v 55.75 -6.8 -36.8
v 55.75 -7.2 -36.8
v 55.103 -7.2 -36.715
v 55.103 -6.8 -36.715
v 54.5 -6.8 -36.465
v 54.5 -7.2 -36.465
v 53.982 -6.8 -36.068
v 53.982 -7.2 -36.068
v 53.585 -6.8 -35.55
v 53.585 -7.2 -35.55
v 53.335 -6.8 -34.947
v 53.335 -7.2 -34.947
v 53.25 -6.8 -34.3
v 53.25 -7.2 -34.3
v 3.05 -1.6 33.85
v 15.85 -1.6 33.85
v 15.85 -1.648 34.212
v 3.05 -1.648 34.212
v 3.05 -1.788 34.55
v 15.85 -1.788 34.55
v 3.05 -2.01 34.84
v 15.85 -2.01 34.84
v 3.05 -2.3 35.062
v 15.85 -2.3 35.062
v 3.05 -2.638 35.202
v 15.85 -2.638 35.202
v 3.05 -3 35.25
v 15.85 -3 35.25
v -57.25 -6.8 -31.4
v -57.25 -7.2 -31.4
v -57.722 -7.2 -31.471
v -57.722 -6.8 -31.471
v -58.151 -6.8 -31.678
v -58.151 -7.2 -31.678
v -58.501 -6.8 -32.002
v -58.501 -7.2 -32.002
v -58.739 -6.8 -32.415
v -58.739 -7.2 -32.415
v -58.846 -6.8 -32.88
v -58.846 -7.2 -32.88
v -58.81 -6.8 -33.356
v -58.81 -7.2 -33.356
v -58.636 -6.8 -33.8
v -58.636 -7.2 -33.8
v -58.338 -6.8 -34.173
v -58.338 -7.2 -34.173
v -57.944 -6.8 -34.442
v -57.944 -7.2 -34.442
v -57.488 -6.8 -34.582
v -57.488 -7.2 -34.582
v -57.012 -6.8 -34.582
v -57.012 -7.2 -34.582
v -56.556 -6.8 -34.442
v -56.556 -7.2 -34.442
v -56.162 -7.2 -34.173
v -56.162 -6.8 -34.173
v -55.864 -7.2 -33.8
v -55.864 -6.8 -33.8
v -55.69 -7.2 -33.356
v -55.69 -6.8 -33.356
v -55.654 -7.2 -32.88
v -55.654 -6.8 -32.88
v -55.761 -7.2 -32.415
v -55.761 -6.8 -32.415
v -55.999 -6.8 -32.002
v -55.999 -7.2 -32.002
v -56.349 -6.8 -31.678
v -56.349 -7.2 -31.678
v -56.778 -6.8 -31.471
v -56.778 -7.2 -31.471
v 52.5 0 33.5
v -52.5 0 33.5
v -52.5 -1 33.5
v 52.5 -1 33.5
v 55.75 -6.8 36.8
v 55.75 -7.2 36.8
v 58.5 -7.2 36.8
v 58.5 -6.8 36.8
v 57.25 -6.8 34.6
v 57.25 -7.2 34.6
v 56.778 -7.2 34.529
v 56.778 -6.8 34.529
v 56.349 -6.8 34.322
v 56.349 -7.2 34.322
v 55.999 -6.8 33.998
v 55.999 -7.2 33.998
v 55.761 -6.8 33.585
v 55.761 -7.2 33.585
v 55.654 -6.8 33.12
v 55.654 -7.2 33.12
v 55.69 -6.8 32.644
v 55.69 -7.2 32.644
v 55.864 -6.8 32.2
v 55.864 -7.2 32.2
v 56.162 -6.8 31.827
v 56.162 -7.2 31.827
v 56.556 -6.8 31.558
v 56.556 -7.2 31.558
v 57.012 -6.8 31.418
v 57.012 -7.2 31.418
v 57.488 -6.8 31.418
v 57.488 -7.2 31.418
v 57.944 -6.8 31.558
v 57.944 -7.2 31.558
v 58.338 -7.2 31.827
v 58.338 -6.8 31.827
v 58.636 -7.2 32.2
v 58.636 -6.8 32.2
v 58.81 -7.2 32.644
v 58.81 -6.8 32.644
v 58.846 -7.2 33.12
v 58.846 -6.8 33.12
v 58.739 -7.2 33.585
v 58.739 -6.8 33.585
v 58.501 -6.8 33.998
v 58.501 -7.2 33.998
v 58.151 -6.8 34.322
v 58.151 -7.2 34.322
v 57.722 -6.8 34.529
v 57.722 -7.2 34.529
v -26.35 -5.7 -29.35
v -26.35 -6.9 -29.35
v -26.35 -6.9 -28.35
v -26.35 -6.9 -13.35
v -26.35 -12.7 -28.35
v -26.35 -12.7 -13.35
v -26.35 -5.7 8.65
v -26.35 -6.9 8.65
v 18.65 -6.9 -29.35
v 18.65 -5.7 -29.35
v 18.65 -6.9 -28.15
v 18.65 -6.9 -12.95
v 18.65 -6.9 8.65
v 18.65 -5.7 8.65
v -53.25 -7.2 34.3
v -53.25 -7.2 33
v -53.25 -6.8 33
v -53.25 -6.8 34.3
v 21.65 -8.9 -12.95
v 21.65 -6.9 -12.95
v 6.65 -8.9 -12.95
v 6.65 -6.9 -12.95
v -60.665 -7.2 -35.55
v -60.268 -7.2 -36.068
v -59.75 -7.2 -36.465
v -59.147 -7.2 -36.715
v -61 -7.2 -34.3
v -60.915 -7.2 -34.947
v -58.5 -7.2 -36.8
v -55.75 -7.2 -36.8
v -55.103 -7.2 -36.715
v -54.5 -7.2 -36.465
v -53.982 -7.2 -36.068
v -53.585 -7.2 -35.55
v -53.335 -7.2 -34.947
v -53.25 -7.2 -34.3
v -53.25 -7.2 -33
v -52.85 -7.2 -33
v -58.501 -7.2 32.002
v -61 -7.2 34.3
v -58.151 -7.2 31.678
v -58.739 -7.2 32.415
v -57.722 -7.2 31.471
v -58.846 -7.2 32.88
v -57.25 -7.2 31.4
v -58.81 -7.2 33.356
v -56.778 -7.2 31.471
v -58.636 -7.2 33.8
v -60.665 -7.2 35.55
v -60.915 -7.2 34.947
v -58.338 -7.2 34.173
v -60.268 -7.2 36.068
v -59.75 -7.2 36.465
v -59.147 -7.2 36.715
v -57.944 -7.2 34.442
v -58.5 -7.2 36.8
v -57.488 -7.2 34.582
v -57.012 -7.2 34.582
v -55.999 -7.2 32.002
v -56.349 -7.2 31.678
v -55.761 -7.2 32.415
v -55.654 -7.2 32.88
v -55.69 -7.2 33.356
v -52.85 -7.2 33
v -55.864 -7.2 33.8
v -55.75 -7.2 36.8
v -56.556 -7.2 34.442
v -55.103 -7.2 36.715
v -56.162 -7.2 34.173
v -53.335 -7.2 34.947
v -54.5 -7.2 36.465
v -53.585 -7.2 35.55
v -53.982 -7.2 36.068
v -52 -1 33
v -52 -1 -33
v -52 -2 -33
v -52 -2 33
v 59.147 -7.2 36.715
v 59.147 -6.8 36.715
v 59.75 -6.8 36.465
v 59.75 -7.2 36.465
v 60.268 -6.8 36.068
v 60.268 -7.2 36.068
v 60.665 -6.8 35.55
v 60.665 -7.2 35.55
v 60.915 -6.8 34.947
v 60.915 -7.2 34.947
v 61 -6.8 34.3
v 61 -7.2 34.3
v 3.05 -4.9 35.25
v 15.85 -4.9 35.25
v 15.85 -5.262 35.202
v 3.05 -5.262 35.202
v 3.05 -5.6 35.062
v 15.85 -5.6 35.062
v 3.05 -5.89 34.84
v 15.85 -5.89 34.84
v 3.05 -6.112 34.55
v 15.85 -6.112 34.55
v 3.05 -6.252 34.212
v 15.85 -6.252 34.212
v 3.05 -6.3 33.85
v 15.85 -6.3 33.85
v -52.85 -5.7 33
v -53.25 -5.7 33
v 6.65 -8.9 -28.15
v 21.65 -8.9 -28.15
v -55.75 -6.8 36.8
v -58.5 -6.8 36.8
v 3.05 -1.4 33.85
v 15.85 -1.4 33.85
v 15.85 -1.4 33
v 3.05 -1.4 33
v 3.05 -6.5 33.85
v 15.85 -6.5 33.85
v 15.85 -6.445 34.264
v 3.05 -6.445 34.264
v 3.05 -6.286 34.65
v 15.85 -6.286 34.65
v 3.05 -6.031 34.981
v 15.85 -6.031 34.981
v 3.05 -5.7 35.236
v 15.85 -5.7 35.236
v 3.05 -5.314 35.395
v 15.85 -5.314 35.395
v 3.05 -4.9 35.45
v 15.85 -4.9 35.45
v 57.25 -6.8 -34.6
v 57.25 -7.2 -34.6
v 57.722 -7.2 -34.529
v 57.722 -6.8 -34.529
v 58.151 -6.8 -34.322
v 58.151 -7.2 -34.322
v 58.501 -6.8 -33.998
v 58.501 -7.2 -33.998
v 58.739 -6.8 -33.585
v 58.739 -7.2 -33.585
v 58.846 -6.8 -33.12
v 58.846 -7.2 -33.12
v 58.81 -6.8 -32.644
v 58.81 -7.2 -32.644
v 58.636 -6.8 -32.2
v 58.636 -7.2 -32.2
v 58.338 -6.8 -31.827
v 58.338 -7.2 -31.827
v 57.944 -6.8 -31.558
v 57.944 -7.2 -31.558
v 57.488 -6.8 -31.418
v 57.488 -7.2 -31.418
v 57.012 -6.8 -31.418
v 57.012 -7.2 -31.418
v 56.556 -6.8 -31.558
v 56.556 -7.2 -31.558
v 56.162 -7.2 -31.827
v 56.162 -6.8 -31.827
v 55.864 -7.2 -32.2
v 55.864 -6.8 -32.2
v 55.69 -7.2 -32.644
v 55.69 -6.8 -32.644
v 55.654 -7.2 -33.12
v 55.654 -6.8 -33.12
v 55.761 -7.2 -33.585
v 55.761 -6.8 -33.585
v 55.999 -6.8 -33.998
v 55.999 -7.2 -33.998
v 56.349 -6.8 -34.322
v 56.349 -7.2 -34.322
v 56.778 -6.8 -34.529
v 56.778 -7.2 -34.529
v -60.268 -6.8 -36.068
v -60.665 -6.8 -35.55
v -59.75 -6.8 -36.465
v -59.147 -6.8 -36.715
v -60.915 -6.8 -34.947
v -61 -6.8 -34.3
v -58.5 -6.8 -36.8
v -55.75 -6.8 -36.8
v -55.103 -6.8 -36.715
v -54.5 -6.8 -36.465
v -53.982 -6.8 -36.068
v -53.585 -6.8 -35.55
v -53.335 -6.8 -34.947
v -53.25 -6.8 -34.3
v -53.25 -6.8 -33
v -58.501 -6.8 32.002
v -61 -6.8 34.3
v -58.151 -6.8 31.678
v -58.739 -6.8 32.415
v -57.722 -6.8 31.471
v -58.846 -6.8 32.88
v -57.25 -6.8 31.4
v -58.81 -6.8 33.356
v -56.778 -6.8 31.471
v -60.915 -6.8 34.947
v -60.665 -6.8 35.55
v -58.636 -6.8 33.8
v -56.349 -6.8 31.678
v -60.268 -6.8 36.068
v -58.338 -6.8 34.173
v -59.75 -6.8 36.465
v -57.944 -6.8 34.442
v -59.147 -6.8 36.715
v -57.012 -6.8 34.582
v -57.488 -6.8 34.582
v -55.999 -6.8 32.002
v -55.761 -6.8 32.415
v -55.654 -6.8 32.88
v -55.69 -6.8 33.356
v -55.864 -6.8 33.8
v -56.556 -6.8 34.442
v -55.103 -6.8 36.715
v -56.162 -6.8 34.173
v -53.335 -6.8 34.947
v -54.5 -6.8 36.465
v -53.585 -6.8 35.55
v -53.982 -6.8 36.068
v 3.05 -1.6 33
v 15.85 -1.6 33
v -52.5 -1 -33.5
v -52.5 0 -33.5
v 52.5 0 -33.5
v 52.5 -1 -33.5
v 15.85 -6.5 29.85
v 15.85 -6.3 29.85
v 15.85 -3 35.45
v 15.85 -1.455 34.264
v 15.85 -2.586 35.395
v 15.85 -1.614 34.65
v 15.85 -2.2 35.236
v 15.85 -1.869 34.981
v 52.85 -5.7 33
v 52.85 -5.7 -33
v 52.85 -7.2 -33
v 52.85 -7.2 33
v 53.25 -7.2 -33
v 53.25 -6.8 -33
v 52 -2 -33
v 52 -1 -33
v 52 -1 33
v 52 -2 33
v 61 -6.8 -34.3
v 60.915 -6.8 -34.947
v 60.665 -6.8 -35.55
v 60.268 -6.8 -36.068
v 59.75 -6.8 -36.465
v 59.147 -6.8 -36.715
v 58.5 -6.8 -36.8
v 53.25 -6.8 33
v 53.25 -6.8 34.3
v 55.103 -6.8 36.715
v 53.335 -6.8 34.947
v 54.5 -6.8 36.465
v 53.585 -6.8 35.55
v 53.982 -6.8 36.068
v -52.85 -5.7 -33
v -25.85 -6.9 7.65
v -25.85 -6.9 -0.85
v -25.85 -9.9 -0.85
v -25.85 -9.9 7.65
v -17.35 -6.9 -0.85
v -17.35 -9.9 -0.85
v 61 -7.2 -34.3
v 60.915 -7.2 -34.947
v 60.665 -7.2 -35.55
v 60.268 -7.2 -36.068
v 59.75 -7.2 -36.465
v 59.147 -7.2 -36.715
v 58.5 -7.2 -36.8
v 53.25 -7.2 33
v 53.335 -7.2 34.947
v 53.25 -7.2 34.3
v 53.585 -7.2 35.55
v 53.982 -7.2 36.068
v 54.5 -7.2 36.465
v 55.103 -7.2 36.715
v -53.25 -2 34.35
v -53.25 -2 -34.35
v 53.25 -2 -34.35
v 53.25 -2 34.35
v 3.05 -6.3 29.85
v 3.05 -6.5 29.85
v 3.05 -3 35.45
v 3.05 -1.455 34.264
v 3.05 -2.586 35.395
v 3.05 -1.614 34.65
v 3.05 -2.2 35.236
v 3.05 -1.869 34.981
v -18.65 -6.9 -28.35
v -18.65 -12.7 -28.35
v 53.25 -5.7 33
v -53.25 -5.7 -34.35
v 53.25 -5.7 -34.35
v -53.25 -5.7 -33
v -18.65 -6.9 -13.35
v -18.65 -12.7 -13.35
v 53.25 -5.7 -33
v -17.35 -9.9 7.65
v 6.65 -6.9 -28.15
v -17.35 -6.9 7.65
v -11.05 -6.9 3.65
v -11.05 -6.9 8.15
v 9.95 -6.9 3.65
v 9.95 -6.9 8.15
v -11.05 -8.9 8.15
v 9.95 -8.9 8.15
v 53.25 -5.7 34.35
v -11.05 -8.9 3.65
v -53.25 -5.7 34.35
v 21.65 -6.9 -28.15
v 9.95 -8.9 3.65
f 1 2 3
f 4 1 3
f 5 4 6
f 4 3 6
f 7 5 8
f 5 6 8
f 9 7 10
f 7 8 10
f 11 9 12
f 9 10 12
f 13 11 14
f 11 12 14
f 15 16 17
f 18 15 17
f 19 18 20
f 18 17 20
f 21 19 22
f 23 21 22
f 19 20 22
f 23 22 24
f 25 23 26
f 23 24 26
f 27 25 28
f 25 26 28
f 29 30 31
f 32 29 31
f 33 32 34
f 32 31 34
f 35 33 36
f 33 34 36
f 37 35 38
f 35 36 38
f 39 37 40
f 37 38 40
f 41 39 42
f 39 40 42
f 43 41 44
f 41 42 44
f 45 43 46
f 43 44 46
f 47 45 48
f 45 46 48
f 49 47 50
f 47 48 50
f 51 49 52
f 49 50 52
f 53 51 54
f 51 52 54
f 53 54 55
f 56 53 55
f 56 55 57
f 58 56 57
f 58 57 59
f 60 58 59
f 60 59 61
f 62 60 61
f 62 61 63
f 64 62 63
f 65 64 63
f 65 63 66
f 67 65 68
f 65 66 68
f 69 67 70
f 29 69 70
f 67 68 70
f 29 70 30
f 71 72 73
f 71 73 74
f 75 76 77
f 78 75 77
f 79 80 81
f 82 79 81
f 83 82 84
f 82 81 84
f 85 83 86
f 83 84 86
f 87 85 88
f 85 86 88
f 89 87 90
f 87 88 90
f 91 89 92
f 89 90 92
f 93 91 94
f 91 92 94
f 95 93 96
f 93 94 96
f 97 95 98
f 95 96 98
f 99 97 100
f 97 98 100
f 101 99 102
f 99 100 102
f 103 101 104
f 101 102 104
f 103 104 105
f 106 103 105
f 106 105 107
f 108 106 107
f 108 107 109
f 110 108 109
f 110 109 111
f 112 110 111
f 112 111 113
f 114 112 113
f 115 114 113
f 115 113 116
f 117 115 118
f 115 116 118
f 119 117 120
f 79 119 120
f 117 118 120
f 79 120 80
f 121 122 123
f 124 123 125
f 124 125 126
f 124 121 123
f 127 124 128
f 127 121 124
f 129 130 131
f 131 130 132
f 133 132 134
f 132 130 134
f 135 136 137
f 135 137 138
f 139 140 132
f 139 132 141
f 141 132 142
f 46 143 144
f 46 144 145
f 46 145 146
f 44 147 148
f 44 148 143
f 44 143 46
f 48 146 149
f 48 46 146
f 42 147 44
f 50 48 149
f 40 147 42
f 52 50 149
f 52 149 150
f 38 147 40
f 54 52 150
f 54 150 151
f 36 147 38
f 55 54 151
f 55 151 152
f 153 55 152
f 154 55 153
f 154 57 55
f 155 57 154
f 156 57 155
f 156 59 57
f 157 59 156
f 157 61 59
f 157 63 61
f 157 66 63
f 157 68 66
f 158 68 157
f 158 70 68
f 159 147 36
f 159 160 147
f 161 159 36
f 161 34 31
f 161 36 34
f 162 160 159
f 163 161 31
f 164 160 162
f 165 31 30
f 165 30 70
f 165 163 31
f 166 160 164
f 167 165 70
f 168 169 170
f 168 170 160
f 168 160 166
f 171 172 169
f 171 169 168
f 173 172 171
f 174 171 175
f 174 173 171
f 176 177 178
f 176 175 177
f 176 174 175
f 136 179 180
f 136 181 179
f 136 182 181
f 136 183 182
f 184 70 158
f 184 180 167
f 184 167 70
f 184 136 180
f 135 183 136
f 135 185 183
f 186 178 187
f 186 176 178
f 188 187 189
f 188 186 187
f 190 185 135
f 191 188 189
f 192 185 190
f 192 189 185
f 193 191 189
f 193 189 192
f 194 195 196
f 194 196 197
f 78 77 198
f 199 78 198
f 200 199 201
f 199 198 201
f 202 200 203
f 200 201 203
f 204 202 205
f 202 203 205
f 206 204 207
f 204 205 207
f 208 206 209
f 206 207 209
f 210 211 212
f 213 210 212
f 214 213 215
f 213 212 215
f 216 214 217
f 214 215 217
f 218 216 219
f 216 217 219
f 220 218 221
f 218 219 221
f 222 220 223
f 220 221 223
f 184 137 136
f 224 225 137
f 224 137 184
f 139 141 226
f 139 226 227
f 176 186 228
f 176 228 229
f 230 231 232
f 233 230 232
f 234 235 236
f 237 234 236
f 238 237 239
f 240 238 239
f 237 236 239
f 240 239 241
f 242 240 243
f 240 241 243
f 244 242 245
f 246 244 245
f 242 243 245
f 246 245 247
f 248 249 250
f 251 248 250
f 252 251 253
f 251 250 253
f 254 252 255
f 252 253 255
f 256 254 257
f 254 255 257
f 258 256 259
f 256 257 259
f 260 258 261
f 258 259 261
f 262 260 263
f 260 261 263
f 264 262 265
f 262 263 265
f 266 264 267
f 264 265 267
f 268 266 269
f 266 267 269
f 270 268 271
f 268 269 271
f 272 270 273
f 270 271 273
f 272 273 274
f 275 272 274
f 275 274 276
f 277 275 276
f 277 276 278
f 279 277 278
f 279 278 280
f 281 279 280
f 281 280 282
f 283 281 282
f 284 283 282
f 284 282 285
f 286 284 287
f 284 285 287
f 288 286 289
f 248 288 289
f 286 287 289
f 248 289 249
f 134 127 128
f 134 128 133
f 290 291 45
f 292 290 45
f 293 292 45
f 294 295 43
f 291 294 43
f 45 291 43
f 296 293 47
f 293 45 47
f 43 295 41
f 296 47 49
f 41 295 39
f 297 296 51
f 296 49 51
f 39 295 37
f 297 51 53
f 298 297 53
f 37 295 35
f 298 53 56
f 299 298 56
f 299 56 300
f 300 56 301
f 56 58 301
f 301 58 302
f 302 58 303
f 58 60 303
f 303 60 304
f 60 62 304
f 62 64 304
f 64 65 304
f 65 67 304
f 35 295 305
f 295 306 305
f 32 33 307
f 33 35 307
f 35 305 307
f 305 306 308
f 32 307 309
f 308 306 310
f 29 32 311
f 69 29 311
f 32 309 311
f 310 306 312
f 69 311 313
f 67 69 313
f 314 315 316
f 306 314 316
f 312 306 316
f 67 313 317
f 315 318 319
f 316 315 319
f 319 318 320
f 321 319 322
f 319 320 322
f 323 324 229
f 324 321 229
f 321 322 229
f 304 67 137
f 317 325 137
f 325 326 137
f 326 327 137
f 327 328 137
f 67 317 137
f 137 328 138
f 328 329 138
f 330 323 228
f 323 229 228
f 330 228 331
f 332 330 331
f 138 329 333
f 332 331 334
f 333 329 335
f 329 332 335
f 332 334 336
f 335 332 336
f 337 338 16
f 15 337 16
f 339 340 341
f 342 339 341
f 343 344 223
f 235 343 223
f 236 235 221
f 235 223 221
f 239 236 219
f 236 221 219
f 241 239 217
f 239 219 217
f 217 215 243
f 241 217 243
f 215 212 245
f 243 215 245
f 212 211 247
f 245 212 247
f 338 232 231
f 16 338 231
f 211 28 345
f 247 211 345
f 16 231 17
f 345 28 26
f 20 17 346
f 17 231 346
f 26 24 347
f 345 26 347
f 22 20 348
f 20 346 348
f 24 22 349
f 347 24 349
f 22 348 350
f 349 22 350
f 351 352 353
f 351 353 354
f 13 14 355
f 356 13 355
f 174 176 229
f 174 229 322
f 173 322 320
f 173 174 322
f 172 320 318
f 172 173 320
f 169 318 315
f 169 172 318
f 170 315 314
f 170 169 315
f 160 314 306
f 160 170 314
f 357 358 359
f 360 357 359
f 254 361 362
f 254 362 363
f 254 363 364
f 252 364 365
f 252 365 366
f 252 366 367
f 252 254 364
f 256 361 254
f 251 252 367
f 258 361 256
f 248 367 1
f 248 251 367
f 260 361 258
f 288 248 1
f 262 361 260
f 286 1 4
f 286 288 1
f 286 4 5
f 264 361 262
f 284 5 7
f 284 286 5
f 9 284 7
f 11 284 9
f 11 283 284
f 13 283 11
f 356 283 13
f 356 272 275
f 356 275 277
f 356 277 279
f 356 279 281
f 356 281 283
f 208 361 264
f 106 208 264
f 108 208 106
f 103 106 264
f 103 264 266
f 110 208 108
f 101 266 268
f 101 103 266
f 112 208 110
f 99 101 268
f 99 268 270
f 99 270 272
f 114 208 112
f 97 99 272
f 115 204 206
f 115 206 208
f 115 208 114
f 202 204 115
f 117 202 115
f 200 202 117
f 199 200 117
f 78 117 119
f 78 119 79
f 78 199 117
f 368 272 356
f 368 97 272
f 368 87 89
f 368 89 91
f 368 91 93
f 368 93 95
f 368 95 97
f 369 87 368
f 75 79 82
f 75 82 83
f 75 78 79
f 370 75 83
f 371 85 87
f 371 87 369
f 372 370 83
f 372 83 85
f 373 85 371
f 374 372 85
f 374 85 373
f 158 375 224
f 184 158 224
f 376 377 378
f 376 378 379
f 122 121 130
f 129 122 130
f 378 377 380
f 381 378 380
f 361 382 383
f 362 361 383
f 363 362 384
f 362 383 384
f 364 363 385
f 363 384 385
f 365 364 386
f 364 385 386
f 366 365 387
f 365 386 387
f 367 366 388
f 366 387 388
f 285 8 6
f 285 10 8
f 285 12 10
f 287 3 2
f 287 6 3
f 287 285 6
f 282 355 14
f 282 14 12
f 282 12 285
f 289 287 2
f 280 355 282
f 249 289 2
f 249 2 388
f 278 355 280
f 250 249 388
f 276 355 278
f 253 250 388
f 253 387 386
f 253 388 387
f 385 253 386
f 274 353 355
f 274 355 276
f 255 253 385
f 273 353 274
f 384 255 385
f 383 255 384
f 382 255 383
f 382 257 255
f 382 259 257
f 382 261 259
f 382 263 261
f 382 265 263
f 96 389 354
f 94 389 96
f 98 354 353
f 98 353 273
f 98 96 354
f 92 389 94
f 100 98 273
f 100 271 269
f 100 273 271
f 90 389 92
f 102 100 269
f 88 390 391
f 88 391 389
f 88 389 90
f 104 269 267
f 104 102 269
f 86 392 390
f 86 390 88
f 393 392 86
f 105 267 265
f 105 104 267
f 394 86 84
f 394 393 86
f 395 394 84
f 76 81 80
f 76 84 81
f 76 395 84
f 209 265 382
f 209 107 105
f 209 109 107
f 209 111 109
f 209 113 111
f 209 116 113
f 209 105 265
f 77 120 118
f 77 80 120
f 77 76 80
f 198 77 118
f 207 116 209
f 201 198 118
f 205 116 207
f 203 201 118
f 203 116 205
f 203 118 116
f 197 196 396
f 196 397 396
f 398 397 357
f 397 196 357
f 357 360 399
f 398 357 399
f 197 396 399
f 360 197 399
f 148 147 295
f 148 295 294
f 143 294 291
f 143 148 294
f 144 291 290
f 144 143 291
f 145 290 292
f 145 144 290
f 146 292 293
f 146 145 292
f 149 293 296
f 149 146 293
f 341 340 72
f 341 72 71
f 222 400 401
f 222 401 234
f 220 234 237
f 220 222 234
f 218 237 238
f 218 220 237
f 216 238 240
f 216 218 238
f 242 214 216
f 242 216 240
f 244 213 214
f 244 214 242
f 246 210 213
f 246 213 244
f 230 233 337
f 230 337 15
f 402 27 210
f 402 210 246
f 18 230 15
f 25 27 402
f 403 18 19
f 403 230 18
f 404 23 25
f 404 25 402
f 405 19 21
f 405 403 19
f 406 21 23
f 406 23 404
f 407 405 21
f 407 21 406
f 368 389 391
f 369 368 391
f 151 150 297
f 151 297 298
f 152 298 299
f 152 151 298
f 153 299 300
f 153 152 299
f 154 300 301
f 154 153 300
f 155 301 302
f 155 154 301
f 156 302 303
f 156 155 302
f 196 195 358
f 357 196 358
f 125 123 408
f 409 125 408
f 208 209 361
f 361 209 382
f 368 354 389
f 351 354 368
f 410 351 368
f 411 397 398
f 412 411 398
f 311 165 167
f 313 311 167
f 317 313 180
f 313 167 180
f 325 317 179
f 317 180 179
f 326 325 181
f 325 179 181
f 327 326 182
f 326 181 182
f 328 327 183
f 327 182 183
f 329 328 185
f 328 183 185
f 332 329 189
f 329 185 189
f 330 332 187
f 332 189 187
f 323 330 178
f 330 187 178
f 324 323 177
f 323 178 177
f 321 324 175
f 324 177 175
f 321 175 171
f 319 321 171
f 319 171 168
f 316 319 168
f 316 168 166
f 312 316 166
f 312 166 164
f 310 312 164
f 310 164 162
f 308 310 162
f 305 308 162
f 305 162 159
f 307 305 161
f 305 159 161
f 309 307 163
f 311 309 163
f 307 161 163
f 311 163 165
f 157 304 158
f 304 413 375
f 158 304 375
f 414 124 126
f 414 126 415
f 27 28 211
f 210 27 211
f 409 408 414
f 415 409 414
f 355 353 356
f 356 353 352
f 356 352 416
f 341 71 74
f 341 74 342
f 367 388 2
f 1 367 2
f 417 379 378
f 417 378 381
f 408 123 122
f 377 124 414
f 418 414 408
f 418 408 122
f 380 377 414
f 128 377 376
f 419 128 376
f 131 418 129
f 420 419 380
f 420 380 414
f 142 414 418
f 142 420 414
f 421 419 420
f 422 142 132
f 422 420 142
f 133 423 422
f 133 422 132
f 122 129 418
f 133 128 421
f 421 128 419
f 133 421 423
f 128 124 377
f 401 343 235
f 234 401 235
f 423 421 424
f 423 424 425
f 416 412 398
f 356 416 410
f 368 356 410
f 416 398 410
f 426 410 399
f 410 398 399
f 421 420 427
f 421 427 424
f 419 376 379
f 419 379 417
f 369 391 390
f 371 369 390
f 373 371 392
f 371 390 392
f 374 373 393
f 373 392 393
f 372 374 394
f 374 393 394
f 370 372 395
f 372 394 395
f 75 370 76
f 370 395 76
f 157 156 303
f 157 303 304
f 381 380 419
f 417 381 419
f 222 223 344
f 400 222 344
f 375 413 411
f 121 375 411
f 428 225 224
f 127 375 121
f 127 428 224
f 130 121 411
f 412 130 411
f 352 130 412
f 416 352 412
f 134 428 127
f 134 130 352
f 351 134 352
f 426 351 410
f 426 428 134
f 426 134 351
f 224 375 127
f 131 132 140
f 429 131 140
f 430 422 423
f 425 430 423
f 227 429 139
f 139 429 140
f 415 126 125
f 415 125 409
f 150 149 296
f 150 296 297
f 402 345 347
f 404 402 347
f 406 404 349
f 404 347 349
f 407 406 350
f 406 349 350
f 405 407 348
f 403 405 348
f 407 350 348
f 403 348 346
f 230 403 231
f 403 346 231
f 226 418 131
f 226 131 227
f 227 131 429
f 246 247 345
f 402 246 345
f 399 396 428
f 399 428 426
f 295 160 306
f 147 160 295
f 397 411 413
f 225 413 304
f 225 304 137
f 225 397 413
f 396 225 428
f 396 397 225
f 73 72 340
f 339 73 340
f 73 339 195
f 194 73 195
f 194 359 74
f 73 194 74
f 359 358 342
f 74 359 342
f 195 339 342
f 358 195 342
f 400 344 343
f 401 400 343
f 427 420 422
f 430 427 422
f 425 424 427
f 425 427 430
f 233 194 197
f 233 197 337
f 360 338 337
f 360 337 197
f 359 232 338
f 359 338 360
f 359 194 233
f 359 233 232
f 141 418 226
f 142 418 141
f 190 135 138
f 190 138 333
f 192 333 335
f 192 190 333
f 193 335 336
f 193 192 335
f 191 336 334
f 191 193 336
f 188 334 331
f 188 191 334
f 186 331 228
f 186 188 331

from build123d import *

# Parameters (mm, degrees)
SKETCH_1_W       = 105
SKETCH_1_H       = 67
EXTRUDE_1_DEPTH  = 1
SKETCH_2_W       = 104
SKETCH_2_H       = 66
EXTRUDE_2_DEPTH  = 1
SKETCH_3_W       = 106.5
SKETCH_3_H       = 68.7
EXTRUDE_3_DEPTH  = 3.7
SKETCH_4_W       = 0.4
SKETCH_4_H       = 66
EXTRUDE_4_DEPTH  = 1.5
SKETCH_5_R       = 1.6
EXTRUDE_5_DEPTH  = 0.4
SKETCH_7_W       = 45
SKETCH_7_H       = 38
EXTRUDE_6_DEPTH  = 1.2
SKETCH_8_W       = 7.7
SKETCH_8_H       = 15
EXTRUDE_7_DEPTH  = 5.8
SKETCH_8_3_W     = 8.5
SKETCH_8_3_H     = 8.5
EXTRUDE_8_DEPTH  = 3
SKETCH_8_4_W     = 21
SKETCH_8_4_H     = 4.5
EXTRUDE_9_DEPTH  = 2
SKETCH_8_5_W     = 15
SKETCH_8_5_H     = 15.2
EXTRUDE_10_DEPTH = 2
EXTRUDE_START    = -37.4
EXTRUDE_11_DEPTH = 12.8


with BuildPart() as part:
    # 草圖1 → 填料-伸長1 (new body)
    with BuildSketch(Plane(origin=(0, 0, 0), x_dir=(1, 0, 0), z_dir=(0, 1, 0))):
        Rectangle(SKETCH_1_W, SKETCH_1_H)
    extrude(amount=-EXTRUDE_1_DEPTH)

    # 草圖2 → 填料-伸長2 (add)
    with BuildSketch(Plane.XZ.offset(1)):
        Rectangle(SKETCH_2_W, SKETCH_2_H)
    extrude(amount=EXTRUDE_2_DEPTH)

    # 草圖3 → 填料-伸長3 (add)
    with BuildSketch(Plane.XZ.offset(2)):
        Rectangle(SKETCH_3_W, SKETCH_3_H)
    extrude(amount=EXTRUDE_3_DEPTH)

    # 草圖4 → 填料-伸長4 (add)
    with BuildSketch(Plane.XZ.offset(5.7)):
        with Locations((-53.05, 0)):
            Rectangle(SKETCH_4_W, SKETCH_4_H)
        with Locations((53.05, 0)):
            Rectangle(SKETCH_4_W, SKETCH_4_H)
    extrude(amount=EXTRUDE_4_DEPTH)

    # 草圖5 → 填料-伸長5 (add)
    # profile 1 of 2: a face of its own
    with BuildSketch(Plane.XZ.offset(7.2)):
        with BuildLine():
            Line((-55.75, 36.8), (-58.5, 36.8))
            ThreePointArc((-58.5, 36.8), (-60.267766953, 36.067766953), (-61, 34.3))
            Line((-61, 34.3), (-61, -34.3))
            ThreePointArc((-61, -34.3), (-60.267766953, -36.067766953), (-58.5, -36.8))
            Line((-58.5, -36.8), (-55.75, -36.8))
            ThreePointArc((-55.75, -36.8), (-53.982233047, -36.067766953), (-53.25, -34.3))
            Line((-53.25, -34.3), (-53.25, 34.3))
            ThreePointArc((-53.25, 34.3), (-53.982233047, 36.067766953), (-55.75, 36.8))
        make_face()
        with Locations((-57.25, 33)):
            Circle(SKETCH_5_R, mode=Mode.SUBTRACT)
        with Locations((-57.25, -33)):
            Circle(SKETCH_5_R, mode=Mode.SUBTRACT)
    # profile 2 of 2: a face of its own
    with BuildSketch(Plane.XZ.offset(7.2)):
        with BuildLine():
            Line((61, 34.3), (61, -34.3))
            ThreePointArc((61, -34.3), (60.267766953, -36.067766953), (58.5, -36.8))
            Line((58.5, -36.8), (55.75, -36.8))
            ThreePointArc((55.75, -36.8), (53.982233047, -36.067766953), (53.25, -34.3))
            Line((53.25, -34.3), (53.25, 34.3))
            ThreePointArc((53.25, 34.3), (53.982233047, 36.067766953), (55.75, 36.8))
            Line((55.75, 36.8), (58.5, 36.8))
            ThreePointArc((58.5, 36.8), (60.267766953, 36.067766953), (61, 34.3))
        make_face()
        with Locations((57.25, -33)):
            Circle(SKETCH_5_R, mode=Mode.SUBTRACT)
        with Locations((57.25, 33)):
            Circle(SKETCH_5_R, mode=Mode.SUBTRACT)
    extrude(amount=-EXTRUDE_5_DEPTH)

    # 草圖7 → 填料-伸長6 (add)
    with BuildSketch(Plane.XZ.offset(5.7)):
        with Locations((-3.85, -10.35)):
            Rectangle(SKETCH_7_W, SKETCH_7_H)
    extrude(amount=EXTRUDE_6_DEPTH)

    # 草圖8 → 填料-伸長7 (add)
    with BuildSketch(Plane.XZ.offset(6.9)):
        with Locations((-22.5, -20.85)):
            Rectangle(SKETCH_8_W, SKETCH_8_H)
    extrude(amount=EXTRUDE_7_DEPTH)

    # 草圖8<3> → 填料-伸長8 (add)
    with BuildSketch(Plane.XZ.offset(6.9)):
        with Locations((-21.6, 3.4)):
            Rectangle(SKETCH_8_3_W, SKETCH_8_3_H)
    extrude(amount=EXTRUDE_8_DEPTH)

    # 草圖8<4> → 填料-伸長9 (add)
    with BuildSketch(Plane.XZ.offset(6.9)):
        with Locations((-0.55, 5.9)):
            Rectangle(SKETCH_8_4_W, SKETCH_8_4_H)
    extrude(amount=EXTRUDE_9_DEPTH)

    # 草圖8<5> → 填料-伸長10 (add)
    with BuildSketch(Plane.XZ.offset(6.9)):
        with Locations((14.15, -20.55)):
            Rectangle(SKETCH_8_5_W, SKETCH_8_5_H)
    extrude(amount=EXTRUDE_10_DEPTH)

    # 草圖9 → 填料-伸長11 (add)
    with BuildSketch(Plane(origin=(53.25, 0, 0), x_dir=(0, 0, -1), z_dir=(1, 0, 0)).offset(EXTRUDE_START)):
        with BuildLine():
            Line((-33.85, -6.3), (-29.85, -6.3))
            Line((-29.85, -6.3), (-29.85, -6.5))
            Line((-29.85, -6.5), (-33.85, -6.5))
            ThreePointArc((-33.85, -6.5), (-34.98137085, -6.03137085), (-35.45, -4.9))
            Line((-35.45, -4.9), (-35.45, -3))
            ThreePointArc((-35.45, -3), (-34.98137085, -1.86862915), (-33.85, -1.4))
            Line((-33.85, -1.4), (-33, -1.4))
            Line((-33, -1.4), (-33, -1.6))
            Line((-33, -1.6), (-33.85, -1.6))
            ThreePointArc((-33.85, -1.6), (-34.839949494, -2.010050506), (-35.25, -3))
            Line((-35.25, -3), (-35.25, -4.9))
            ThreePointArc((-35.25, -4.9), (-34.839949494, -5.889949494), (-33.85, -6.3))
        make_face()
    extrude(amount=-EXTRUDE_11_DEPTH)


solid = part.part
